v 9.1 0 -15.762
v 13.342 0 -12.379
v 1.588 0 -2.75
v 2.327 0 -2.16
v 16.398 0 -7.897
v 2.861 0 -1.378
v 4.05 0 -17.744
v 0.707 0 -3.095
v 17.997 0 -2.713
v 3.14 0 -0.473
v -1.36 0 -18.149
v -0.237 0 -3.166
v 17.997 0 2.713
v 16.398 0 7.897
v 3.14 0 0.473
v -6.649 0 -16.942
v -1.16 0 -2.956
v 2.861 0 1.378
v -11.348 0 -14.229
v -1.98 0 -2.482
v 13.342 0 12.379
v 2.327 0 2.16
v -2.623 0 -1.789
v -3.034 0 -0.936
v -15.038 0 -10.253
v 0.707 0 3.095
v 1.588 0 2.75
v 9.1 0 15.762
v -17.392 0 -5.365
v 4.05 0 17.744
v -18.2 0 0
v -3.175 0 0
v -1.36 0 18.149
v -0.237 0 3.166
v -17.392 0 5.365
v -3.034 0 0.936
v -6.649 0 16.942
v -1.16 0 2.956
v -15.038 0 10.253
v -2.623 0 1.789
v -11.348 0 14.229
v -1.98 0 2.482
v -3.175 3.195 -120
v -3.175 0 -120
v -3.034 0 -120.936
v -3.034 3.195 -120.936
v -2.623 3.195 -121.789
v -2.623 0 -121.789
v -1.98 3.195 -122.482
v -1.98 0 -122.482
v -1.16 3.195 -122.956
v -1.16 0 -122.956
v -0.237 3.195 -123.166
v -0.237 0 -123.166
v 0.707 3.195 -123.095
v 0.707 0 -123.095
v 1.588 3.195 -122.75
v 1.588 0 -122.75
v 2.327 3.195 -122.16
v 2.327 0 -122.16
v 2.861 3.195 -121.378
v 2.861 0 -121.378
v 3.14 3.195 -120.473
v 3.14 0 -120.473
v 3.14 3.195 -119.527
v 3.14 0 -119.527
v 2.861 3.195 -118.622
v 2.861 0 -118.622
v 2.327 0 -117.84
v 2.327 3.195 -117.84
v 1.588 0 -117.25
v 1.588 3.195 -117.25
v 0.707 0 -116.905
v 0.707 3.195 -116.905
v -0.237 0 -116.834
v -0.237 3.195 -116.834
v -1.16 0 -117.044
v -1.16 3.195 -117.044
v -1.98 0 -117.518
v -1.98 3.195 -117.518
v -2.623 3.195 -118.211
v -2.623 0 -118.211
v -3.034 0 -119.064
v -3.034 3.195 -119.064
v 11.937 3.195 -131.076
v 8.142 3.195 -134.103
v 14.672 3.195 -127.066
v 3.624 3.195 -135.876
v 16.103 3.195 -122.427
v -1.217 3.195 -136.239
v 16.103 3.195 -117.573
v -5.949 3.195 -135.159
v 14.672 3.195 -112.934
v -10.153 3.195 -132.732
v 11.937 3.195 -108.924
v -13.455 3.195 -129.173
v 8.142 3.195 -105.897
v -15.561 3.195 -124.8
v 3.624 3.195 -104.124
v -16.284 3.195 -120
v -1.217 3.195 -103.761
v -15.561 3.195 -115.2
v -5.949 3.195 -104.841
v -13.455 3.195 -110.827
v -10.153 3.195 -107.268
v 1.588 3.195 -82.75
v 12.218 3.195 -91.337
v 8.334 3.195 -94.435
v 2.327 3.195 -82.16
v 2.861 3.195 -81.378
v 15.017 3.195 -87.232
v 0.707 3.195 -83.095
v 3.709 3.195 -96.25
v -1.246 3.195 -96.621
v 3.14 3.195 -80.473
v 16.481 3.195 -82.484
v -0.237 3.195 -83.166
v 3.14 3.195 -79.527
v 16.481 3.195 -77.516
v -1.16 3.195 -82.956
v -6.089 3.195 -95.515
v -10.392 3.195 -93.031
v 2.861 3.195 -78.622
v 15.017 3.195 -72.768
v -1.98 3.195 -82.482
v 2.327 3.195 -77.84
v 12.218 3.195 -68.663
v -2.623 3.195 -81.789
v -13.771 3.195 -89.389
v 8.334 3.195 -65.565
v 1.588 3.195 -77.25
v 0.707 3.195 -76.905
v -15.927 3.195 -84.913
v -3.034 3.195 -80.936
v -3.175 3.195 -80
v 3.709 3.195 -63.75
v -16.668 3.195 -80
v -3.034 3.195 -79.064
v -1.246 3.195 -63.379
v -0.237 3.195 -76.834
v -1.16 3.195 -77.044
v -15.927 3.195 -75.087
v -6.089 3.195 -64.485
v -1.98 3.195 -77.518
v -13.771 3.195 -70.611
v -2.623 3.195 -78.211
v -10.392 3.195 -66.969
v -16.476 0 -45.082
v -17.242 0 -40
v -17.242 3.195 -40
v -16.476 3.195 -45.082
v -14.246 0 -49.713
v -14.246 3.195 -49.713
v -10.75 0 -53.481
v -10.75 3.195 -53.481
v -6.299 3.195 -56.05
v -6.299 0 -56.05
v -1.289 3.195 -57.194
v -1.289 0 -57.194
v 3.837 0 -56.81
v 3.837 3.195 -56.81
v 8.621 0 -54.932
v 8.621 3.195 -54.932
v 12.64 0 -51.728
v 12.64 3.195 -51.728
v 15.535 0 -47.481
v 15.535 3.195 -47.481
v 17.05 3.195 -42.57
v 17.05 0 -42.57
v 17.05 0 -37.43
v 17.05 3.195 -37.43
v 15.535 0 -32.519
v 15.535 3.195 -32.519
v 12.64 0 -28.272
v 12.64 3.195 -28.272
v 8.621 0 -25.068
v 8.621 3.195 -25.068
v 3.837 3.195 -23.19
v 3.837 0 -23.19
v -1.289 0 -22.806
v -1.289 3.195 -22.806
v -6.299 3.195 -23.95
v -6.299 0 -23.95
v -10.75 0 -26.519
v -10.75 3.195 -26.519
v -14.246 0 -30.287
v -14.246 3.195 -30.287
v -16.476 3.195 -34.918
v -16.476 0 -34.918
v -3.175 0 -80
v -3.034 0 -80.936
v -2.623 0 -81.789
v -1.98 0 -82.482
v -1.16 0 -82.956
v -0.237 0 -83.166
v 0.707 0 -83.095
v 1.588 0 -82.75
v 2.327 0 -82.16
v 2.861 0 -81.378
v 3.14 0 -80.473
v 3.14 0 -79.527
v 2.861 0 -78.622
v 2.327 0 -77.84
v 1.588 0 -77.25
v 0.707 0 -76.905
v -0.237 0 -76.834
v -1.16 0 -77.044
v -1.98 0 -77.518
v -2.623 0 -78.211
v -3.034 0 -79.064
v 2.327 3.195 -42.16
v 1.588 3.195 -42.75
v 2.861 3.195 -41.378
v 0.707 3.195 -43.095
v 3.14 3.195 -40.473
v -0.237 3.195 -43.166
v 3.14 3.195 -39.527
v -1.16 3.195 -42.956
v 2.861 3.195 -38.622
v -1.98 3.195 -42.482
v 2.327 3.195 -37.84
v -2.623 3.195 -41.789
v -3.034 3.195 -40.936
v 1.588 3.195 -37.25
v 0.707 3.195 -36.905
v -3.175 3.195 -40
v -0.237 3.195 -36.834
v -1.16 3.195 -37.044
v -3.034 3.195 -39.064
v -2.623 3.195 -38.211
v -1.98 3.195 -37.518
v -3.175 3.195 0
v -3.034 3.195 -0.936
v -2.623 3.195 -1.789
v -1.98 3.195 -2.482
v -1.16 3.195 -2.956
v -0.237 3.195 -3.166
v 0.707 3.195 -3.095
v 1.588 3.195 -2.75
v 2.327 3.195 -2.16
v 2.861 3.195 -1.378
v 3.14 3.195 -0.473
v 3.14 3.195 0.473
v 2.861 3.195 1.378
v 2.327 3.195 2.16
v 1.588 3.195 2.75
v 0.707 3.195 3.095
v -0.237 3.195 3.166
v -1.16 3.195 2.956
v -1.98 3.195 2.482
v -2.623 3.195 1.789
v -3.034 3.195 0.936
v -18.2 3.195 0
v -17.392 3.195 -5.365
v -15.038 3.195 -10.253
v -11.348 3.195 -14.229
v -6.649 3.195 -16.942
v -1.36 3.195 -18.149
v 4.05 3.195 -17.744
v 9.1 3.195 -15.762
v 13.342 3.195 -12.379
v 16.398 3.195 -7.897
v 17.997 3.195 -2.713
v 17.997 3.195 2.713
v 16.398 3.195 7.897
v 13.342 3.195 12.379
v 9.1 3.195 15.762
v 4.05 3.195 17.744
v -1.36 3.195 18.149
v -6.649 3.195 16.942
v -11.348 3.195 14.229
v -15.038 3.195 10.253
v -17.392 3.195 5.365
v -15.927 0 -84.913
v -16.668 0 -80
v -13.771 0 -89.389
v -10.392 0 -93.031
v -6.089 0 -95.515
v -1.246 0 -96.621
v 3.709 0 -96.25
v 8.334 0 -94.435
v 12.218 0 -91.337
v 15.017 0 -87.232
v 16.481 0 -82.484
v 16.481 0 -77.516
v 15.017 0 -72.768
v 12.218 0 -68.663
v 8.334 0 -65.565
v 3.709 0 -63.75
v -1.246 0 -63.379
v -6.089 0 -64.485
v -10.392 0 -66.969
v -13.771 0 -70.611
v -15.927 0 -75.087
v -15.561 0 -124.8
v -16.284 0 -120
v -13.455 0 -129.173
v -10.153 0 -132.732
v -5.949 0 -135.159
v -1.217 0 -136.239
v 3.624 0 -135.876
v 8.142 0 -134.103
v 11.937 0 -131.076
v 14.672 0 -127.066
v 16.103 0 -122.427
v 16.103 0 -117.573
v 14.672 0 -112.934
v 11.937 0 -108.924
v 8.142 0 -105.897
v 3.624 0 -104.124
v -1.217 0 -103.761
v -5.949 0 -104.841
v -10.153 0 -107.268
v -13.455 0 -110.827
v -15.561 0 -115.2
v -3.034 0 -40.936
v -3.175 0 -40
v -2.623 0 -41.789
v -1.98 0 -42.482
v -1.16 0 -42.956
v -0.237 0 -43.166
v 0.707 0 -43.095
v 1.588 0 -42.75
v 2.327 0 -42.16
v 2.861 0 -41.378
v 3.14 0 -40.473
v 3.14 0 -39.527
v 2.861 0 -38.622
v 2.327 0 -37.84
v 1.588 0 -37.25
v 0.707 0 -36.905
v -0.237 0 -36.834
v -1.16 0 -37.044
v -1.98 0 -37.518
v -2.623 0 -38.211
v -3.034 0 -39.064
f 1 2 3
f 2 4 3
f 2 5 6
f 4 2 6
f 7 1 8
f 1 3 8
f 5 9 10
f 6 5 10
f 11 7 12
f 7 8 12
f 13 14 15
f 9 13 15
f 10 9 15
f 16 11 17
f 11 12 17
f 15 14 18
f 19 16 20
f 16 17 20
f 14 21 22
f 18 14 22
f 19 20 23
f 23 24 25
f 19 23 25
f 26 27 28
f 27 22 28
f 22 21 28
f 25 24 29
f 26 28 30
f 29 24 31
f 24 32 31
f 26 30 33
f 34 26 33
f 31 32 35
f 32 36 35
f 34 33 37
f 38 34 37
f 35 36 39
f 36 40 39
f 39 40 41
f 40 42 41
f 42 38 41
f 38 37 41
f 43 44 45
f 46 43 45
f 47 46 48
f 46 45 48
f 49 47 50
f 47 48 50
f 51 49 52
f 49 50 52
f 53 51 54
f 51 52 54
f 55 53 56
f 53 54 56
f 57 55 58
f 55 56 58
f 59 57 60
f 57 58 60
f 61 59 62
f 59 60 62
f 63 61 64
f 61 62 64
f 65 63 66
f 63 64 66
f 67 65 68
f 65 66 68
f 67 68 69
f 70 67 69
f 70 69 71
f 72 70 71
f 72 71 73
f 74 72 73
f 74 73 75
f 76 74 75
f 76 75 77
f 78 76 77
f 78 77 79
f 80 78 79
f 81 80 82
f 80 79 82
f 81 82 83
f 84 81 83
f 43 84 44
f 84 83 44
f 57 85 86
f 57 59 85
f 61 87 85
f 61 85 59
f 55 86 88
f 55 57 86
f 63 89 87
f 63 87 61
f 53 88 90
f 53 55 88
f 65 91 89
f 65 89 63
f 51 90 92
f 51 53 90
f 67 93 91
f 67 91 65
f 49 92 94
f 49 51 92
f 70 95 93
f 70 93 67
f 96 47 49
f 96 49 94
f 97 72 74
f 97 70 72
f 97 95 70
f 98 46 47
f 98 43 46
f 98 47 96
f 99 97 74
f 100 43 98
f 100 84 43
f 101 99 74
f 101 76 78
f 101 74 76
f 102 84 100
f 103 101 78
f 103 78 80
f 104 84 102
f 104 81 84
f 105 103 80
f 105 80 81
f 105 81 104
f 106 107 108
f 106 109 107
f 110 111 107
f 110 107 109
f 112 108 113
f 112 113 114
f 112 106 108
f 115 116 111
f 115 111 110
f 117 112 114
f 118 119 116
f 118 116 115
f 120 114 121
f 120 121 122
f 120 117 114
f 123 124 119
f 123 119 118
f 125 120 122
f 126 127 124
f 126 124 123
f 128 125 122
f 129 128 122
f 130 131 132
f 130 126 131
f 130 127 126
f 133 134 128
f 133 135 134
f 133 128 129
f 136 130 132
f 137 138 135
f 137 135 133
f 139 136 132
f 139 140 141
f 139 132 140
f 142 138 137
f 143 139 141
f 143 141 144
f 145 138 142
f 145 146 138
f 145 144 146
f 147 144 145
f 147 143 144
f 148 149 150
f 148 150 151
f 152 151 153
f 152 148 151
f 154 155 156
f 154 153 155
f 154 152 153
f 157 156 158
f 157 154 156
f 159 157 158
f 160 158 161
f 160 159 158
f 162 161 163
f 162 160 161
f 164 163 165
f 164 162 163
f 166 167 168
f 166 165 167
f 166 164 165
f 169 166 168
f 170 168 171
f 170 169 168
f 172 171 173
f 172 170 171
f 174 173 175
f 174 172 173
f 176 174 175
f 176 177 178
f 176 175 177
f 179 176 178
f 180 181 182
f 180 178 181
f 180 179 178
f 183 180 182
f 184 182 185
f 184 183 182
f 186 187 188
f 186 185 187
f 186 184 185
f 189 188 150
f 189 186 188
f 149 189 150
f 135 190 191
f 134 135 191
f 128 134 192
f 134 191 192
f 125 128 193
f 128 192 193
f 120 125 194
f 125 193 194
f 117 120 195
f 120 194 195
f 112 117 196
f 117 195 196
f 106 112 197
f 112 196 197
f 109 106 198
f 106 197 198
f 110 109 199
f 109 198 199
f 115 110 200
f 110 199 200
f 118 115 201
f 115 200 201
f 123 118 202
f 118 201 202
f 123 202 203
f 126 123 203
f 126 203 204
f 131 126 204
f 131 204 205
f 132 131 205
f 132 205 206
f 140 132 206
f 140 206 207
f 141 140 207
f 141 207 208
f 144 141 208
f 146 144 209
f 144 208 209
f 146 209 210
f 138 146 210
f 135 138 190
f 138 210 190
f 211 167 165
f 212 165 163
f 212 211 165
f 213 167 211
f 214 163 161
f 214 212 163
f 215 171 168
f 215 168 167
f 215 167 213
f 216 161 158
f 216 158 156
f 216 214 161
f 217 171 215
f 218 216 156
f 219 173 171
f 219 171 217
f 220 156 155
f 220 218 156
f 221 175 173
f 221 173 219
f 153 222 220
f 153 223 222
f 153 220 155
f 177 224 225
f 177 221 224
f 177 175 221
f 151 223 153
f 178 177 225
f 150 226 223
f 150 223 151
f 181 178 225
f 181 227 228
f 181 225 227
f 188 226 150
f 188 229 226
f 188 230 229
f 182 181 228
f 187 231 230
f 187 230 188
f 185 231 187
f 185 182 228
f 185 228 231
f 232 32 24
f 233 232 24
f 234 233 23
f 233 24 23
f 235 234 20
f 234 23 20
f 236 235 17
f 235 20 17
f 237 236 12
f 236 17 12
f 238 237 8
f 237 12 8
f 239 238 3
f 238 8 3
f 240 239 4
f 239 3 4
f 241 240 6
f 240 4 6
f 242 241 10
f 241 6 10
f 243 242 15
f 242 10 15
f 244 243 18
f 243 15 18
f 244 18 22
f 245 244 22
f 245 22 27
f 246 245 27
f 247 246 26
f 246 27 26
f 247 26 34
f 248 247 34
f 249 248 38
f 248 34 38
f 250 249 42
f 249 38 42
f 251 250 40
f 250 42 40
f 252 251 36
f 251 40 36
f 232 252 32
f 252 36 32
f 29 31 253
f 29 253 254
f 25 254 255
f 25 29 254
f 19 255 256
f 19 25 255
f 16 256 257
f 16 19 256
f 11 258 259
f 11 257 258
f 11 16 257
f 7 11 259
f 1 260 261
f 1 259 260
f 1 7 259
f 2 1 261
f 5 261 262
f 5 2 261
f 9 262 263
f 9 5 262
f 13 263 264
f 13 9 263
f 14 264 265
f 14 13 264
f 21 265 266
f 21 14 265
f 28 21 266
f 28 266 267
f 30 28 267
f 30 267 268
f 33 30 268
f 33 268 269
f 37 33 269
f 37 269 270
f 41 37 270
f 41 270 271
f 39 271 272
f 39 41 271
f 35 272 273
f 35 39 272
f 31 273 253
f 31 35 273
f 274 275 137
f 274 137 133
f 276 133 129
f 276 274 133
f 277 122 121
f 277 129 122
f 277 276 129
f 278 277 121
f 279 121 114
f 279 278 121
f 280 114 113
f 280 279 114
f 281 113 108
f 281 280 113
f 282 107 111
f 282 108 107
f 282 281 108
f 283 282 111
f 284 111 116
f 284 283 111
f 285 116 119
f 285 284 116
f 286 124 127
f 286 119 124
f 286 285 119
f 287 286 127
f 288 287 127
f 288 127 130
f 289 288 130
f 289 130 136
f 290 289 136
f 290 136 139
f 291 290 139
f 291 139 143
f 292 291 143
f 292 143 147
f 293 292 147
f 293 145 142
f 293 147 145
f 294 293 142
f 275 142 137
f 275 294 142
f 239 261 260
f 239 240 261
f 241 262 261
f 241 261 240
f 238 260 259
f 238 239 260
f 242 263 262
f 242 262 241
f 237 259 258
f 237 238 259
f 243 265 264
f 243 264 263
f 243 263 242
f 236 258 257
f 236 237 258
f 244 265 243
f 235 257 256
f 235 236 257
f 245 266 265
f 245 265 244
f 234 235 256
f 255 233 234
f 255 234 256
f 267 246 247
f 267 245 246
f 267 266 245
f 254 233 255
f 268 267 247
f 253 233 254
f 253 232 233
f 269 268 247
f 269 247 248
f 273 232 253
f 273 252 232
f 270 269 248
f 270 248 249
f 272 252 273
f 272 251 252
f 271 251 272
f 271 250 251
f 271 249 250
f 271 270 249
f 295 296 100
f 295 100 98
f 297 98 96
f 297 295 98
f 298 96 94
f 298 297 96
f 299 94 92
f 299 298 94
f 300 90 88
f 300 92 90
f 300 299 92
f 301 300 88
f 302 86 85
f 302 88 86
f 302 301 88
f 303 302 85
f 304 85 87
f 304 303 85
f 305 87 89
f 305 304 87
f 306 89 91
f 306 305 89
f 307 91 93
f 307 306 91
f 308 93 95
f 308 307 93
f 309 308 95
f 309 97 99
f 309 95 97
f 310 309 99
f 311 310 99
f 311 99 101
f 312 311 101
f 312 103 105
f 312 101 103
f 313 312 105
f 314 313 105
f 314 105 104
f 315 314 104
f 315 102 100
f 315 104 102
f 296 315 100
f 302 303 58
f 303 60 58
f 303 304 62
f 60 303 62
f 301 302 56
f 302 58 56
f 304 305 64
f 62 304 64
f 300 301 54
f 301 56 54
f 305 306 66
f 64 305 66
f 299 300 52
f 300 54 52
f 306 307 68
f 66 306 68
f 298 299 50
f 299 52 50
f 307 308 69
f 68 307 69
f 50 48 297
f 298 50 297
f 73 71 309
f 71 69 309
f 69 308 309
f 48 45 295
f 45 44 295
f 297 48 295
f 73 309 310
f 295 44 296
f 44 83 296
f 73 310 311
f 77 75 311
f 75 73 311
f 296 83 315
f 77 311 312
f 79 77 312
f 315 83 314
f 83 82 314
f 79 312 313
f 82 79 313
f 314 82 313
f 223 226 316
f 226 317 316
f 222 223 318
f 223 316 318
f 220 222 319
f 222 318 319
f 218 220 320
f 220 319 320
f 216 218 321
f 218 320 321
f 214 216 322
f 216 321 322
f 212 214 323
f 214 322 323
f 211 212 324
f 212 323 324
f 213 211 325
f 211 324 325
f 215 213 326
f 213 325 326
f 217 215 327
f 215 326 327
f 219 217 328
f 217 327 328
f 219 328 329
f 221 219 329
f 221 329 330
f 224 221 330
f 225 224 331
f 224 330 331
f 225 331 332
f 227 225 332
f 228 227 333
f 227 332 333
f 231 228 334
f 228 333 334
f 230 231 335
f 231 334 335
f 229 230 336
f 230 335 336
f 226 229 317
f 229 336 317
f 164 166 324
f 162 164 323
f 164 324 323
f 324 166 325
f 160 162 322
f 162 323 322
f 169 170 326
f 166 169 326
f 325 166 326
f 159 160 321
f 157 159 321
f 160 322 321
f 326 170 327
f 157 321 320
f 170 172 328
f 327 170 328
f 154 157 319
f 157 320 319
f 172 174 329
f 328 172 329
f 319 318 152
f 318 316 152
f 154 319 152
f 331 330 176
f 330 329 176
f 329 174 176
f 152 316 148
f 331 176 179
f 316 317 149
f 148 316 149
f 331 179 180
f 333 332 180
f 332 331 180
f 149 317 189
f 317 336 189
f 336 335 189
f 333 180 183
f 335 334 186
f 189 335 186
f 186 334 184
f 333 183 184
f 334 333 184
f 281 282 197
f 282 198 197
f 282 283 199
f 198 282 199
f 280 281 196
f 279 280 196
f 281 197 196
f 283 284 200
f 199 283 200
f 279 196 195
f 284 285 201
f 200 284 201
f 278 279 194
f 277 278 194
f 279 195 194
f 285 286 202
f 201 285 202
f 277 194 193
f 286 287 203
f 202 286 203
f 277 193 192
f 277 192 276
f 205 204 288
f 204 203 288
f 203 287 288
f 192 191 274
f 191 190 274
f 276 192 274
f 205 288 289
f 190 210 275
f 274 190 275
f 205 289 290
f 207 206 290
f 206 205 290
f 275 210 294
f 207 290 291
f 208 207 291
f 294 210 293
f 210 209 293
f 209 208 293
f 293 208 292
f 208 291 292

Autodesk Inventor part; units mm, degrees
ref_plane "YZ Plane" through (0, 0, 0) normal (1, 0, 0) x (0, 1, 0)
ref_plane "XZ Plane" through (0, 0, 0) normal (0, 1, 0) x (-1, 0, 0)
ref_plane "XY Plane" through (0, 0, 0) normal (0, 0, 1) x (1, 0, 0)
sketch "Sketch1" plane through (0, 0, 0) normal (0, 1, 0) x (-1, 0, 0)
  circle A0 centre (0, 0) radius 3.175
  circle A1 centre (0, 0) radius 18.2002
  circle A2 centre (0, -40) radius 3.175
  circle A3 centre (0, -40) radius 17.2423
  circle A4 centre (0, -80) radius 3.175
  circle A5 centre (0, -80) radius 16.6676
  circle A6 centre (0, -120) radius 3.175
  circle A7 centre (0, -120) radius 16.2844
  dimension "d6" = 6.35
  dimension "d10" = 36.4005
  dimension "d24" = 6.35
  dimension "d25" = 34.4847
  dimension "d27" = 6.35
  dimension "d29" = 33.3352
  dimension "d35" = 6.35
  dimension "d36" = 32.5689
  dimension "d43" = 40
  dimension "d44" = 40
  dimension "d45" = 40
extrude "Extrusion1" add sketch "Sketch1" along normal blind 3.195
equation "\"d10\" = 0.85 * d1"
equation "\"d25\" = 0.85 * d18"
equation "\"d29\" = 0.85 * d20"
equation "\"d36\" = 0.85 * d22"
equation "\"d46\" = 0.5 * WoodThickness"
equation "\"d1\" = 42.8241"
equation "\"d18\" = 40.5702"
equation "\"d20\" = 39.21786"
equation "\"d22\" = 38.3163"
equation "\"WoodThickness\" = 6.39"
properties part number "CouplingHeadSilicone_Spacer_3mm"
